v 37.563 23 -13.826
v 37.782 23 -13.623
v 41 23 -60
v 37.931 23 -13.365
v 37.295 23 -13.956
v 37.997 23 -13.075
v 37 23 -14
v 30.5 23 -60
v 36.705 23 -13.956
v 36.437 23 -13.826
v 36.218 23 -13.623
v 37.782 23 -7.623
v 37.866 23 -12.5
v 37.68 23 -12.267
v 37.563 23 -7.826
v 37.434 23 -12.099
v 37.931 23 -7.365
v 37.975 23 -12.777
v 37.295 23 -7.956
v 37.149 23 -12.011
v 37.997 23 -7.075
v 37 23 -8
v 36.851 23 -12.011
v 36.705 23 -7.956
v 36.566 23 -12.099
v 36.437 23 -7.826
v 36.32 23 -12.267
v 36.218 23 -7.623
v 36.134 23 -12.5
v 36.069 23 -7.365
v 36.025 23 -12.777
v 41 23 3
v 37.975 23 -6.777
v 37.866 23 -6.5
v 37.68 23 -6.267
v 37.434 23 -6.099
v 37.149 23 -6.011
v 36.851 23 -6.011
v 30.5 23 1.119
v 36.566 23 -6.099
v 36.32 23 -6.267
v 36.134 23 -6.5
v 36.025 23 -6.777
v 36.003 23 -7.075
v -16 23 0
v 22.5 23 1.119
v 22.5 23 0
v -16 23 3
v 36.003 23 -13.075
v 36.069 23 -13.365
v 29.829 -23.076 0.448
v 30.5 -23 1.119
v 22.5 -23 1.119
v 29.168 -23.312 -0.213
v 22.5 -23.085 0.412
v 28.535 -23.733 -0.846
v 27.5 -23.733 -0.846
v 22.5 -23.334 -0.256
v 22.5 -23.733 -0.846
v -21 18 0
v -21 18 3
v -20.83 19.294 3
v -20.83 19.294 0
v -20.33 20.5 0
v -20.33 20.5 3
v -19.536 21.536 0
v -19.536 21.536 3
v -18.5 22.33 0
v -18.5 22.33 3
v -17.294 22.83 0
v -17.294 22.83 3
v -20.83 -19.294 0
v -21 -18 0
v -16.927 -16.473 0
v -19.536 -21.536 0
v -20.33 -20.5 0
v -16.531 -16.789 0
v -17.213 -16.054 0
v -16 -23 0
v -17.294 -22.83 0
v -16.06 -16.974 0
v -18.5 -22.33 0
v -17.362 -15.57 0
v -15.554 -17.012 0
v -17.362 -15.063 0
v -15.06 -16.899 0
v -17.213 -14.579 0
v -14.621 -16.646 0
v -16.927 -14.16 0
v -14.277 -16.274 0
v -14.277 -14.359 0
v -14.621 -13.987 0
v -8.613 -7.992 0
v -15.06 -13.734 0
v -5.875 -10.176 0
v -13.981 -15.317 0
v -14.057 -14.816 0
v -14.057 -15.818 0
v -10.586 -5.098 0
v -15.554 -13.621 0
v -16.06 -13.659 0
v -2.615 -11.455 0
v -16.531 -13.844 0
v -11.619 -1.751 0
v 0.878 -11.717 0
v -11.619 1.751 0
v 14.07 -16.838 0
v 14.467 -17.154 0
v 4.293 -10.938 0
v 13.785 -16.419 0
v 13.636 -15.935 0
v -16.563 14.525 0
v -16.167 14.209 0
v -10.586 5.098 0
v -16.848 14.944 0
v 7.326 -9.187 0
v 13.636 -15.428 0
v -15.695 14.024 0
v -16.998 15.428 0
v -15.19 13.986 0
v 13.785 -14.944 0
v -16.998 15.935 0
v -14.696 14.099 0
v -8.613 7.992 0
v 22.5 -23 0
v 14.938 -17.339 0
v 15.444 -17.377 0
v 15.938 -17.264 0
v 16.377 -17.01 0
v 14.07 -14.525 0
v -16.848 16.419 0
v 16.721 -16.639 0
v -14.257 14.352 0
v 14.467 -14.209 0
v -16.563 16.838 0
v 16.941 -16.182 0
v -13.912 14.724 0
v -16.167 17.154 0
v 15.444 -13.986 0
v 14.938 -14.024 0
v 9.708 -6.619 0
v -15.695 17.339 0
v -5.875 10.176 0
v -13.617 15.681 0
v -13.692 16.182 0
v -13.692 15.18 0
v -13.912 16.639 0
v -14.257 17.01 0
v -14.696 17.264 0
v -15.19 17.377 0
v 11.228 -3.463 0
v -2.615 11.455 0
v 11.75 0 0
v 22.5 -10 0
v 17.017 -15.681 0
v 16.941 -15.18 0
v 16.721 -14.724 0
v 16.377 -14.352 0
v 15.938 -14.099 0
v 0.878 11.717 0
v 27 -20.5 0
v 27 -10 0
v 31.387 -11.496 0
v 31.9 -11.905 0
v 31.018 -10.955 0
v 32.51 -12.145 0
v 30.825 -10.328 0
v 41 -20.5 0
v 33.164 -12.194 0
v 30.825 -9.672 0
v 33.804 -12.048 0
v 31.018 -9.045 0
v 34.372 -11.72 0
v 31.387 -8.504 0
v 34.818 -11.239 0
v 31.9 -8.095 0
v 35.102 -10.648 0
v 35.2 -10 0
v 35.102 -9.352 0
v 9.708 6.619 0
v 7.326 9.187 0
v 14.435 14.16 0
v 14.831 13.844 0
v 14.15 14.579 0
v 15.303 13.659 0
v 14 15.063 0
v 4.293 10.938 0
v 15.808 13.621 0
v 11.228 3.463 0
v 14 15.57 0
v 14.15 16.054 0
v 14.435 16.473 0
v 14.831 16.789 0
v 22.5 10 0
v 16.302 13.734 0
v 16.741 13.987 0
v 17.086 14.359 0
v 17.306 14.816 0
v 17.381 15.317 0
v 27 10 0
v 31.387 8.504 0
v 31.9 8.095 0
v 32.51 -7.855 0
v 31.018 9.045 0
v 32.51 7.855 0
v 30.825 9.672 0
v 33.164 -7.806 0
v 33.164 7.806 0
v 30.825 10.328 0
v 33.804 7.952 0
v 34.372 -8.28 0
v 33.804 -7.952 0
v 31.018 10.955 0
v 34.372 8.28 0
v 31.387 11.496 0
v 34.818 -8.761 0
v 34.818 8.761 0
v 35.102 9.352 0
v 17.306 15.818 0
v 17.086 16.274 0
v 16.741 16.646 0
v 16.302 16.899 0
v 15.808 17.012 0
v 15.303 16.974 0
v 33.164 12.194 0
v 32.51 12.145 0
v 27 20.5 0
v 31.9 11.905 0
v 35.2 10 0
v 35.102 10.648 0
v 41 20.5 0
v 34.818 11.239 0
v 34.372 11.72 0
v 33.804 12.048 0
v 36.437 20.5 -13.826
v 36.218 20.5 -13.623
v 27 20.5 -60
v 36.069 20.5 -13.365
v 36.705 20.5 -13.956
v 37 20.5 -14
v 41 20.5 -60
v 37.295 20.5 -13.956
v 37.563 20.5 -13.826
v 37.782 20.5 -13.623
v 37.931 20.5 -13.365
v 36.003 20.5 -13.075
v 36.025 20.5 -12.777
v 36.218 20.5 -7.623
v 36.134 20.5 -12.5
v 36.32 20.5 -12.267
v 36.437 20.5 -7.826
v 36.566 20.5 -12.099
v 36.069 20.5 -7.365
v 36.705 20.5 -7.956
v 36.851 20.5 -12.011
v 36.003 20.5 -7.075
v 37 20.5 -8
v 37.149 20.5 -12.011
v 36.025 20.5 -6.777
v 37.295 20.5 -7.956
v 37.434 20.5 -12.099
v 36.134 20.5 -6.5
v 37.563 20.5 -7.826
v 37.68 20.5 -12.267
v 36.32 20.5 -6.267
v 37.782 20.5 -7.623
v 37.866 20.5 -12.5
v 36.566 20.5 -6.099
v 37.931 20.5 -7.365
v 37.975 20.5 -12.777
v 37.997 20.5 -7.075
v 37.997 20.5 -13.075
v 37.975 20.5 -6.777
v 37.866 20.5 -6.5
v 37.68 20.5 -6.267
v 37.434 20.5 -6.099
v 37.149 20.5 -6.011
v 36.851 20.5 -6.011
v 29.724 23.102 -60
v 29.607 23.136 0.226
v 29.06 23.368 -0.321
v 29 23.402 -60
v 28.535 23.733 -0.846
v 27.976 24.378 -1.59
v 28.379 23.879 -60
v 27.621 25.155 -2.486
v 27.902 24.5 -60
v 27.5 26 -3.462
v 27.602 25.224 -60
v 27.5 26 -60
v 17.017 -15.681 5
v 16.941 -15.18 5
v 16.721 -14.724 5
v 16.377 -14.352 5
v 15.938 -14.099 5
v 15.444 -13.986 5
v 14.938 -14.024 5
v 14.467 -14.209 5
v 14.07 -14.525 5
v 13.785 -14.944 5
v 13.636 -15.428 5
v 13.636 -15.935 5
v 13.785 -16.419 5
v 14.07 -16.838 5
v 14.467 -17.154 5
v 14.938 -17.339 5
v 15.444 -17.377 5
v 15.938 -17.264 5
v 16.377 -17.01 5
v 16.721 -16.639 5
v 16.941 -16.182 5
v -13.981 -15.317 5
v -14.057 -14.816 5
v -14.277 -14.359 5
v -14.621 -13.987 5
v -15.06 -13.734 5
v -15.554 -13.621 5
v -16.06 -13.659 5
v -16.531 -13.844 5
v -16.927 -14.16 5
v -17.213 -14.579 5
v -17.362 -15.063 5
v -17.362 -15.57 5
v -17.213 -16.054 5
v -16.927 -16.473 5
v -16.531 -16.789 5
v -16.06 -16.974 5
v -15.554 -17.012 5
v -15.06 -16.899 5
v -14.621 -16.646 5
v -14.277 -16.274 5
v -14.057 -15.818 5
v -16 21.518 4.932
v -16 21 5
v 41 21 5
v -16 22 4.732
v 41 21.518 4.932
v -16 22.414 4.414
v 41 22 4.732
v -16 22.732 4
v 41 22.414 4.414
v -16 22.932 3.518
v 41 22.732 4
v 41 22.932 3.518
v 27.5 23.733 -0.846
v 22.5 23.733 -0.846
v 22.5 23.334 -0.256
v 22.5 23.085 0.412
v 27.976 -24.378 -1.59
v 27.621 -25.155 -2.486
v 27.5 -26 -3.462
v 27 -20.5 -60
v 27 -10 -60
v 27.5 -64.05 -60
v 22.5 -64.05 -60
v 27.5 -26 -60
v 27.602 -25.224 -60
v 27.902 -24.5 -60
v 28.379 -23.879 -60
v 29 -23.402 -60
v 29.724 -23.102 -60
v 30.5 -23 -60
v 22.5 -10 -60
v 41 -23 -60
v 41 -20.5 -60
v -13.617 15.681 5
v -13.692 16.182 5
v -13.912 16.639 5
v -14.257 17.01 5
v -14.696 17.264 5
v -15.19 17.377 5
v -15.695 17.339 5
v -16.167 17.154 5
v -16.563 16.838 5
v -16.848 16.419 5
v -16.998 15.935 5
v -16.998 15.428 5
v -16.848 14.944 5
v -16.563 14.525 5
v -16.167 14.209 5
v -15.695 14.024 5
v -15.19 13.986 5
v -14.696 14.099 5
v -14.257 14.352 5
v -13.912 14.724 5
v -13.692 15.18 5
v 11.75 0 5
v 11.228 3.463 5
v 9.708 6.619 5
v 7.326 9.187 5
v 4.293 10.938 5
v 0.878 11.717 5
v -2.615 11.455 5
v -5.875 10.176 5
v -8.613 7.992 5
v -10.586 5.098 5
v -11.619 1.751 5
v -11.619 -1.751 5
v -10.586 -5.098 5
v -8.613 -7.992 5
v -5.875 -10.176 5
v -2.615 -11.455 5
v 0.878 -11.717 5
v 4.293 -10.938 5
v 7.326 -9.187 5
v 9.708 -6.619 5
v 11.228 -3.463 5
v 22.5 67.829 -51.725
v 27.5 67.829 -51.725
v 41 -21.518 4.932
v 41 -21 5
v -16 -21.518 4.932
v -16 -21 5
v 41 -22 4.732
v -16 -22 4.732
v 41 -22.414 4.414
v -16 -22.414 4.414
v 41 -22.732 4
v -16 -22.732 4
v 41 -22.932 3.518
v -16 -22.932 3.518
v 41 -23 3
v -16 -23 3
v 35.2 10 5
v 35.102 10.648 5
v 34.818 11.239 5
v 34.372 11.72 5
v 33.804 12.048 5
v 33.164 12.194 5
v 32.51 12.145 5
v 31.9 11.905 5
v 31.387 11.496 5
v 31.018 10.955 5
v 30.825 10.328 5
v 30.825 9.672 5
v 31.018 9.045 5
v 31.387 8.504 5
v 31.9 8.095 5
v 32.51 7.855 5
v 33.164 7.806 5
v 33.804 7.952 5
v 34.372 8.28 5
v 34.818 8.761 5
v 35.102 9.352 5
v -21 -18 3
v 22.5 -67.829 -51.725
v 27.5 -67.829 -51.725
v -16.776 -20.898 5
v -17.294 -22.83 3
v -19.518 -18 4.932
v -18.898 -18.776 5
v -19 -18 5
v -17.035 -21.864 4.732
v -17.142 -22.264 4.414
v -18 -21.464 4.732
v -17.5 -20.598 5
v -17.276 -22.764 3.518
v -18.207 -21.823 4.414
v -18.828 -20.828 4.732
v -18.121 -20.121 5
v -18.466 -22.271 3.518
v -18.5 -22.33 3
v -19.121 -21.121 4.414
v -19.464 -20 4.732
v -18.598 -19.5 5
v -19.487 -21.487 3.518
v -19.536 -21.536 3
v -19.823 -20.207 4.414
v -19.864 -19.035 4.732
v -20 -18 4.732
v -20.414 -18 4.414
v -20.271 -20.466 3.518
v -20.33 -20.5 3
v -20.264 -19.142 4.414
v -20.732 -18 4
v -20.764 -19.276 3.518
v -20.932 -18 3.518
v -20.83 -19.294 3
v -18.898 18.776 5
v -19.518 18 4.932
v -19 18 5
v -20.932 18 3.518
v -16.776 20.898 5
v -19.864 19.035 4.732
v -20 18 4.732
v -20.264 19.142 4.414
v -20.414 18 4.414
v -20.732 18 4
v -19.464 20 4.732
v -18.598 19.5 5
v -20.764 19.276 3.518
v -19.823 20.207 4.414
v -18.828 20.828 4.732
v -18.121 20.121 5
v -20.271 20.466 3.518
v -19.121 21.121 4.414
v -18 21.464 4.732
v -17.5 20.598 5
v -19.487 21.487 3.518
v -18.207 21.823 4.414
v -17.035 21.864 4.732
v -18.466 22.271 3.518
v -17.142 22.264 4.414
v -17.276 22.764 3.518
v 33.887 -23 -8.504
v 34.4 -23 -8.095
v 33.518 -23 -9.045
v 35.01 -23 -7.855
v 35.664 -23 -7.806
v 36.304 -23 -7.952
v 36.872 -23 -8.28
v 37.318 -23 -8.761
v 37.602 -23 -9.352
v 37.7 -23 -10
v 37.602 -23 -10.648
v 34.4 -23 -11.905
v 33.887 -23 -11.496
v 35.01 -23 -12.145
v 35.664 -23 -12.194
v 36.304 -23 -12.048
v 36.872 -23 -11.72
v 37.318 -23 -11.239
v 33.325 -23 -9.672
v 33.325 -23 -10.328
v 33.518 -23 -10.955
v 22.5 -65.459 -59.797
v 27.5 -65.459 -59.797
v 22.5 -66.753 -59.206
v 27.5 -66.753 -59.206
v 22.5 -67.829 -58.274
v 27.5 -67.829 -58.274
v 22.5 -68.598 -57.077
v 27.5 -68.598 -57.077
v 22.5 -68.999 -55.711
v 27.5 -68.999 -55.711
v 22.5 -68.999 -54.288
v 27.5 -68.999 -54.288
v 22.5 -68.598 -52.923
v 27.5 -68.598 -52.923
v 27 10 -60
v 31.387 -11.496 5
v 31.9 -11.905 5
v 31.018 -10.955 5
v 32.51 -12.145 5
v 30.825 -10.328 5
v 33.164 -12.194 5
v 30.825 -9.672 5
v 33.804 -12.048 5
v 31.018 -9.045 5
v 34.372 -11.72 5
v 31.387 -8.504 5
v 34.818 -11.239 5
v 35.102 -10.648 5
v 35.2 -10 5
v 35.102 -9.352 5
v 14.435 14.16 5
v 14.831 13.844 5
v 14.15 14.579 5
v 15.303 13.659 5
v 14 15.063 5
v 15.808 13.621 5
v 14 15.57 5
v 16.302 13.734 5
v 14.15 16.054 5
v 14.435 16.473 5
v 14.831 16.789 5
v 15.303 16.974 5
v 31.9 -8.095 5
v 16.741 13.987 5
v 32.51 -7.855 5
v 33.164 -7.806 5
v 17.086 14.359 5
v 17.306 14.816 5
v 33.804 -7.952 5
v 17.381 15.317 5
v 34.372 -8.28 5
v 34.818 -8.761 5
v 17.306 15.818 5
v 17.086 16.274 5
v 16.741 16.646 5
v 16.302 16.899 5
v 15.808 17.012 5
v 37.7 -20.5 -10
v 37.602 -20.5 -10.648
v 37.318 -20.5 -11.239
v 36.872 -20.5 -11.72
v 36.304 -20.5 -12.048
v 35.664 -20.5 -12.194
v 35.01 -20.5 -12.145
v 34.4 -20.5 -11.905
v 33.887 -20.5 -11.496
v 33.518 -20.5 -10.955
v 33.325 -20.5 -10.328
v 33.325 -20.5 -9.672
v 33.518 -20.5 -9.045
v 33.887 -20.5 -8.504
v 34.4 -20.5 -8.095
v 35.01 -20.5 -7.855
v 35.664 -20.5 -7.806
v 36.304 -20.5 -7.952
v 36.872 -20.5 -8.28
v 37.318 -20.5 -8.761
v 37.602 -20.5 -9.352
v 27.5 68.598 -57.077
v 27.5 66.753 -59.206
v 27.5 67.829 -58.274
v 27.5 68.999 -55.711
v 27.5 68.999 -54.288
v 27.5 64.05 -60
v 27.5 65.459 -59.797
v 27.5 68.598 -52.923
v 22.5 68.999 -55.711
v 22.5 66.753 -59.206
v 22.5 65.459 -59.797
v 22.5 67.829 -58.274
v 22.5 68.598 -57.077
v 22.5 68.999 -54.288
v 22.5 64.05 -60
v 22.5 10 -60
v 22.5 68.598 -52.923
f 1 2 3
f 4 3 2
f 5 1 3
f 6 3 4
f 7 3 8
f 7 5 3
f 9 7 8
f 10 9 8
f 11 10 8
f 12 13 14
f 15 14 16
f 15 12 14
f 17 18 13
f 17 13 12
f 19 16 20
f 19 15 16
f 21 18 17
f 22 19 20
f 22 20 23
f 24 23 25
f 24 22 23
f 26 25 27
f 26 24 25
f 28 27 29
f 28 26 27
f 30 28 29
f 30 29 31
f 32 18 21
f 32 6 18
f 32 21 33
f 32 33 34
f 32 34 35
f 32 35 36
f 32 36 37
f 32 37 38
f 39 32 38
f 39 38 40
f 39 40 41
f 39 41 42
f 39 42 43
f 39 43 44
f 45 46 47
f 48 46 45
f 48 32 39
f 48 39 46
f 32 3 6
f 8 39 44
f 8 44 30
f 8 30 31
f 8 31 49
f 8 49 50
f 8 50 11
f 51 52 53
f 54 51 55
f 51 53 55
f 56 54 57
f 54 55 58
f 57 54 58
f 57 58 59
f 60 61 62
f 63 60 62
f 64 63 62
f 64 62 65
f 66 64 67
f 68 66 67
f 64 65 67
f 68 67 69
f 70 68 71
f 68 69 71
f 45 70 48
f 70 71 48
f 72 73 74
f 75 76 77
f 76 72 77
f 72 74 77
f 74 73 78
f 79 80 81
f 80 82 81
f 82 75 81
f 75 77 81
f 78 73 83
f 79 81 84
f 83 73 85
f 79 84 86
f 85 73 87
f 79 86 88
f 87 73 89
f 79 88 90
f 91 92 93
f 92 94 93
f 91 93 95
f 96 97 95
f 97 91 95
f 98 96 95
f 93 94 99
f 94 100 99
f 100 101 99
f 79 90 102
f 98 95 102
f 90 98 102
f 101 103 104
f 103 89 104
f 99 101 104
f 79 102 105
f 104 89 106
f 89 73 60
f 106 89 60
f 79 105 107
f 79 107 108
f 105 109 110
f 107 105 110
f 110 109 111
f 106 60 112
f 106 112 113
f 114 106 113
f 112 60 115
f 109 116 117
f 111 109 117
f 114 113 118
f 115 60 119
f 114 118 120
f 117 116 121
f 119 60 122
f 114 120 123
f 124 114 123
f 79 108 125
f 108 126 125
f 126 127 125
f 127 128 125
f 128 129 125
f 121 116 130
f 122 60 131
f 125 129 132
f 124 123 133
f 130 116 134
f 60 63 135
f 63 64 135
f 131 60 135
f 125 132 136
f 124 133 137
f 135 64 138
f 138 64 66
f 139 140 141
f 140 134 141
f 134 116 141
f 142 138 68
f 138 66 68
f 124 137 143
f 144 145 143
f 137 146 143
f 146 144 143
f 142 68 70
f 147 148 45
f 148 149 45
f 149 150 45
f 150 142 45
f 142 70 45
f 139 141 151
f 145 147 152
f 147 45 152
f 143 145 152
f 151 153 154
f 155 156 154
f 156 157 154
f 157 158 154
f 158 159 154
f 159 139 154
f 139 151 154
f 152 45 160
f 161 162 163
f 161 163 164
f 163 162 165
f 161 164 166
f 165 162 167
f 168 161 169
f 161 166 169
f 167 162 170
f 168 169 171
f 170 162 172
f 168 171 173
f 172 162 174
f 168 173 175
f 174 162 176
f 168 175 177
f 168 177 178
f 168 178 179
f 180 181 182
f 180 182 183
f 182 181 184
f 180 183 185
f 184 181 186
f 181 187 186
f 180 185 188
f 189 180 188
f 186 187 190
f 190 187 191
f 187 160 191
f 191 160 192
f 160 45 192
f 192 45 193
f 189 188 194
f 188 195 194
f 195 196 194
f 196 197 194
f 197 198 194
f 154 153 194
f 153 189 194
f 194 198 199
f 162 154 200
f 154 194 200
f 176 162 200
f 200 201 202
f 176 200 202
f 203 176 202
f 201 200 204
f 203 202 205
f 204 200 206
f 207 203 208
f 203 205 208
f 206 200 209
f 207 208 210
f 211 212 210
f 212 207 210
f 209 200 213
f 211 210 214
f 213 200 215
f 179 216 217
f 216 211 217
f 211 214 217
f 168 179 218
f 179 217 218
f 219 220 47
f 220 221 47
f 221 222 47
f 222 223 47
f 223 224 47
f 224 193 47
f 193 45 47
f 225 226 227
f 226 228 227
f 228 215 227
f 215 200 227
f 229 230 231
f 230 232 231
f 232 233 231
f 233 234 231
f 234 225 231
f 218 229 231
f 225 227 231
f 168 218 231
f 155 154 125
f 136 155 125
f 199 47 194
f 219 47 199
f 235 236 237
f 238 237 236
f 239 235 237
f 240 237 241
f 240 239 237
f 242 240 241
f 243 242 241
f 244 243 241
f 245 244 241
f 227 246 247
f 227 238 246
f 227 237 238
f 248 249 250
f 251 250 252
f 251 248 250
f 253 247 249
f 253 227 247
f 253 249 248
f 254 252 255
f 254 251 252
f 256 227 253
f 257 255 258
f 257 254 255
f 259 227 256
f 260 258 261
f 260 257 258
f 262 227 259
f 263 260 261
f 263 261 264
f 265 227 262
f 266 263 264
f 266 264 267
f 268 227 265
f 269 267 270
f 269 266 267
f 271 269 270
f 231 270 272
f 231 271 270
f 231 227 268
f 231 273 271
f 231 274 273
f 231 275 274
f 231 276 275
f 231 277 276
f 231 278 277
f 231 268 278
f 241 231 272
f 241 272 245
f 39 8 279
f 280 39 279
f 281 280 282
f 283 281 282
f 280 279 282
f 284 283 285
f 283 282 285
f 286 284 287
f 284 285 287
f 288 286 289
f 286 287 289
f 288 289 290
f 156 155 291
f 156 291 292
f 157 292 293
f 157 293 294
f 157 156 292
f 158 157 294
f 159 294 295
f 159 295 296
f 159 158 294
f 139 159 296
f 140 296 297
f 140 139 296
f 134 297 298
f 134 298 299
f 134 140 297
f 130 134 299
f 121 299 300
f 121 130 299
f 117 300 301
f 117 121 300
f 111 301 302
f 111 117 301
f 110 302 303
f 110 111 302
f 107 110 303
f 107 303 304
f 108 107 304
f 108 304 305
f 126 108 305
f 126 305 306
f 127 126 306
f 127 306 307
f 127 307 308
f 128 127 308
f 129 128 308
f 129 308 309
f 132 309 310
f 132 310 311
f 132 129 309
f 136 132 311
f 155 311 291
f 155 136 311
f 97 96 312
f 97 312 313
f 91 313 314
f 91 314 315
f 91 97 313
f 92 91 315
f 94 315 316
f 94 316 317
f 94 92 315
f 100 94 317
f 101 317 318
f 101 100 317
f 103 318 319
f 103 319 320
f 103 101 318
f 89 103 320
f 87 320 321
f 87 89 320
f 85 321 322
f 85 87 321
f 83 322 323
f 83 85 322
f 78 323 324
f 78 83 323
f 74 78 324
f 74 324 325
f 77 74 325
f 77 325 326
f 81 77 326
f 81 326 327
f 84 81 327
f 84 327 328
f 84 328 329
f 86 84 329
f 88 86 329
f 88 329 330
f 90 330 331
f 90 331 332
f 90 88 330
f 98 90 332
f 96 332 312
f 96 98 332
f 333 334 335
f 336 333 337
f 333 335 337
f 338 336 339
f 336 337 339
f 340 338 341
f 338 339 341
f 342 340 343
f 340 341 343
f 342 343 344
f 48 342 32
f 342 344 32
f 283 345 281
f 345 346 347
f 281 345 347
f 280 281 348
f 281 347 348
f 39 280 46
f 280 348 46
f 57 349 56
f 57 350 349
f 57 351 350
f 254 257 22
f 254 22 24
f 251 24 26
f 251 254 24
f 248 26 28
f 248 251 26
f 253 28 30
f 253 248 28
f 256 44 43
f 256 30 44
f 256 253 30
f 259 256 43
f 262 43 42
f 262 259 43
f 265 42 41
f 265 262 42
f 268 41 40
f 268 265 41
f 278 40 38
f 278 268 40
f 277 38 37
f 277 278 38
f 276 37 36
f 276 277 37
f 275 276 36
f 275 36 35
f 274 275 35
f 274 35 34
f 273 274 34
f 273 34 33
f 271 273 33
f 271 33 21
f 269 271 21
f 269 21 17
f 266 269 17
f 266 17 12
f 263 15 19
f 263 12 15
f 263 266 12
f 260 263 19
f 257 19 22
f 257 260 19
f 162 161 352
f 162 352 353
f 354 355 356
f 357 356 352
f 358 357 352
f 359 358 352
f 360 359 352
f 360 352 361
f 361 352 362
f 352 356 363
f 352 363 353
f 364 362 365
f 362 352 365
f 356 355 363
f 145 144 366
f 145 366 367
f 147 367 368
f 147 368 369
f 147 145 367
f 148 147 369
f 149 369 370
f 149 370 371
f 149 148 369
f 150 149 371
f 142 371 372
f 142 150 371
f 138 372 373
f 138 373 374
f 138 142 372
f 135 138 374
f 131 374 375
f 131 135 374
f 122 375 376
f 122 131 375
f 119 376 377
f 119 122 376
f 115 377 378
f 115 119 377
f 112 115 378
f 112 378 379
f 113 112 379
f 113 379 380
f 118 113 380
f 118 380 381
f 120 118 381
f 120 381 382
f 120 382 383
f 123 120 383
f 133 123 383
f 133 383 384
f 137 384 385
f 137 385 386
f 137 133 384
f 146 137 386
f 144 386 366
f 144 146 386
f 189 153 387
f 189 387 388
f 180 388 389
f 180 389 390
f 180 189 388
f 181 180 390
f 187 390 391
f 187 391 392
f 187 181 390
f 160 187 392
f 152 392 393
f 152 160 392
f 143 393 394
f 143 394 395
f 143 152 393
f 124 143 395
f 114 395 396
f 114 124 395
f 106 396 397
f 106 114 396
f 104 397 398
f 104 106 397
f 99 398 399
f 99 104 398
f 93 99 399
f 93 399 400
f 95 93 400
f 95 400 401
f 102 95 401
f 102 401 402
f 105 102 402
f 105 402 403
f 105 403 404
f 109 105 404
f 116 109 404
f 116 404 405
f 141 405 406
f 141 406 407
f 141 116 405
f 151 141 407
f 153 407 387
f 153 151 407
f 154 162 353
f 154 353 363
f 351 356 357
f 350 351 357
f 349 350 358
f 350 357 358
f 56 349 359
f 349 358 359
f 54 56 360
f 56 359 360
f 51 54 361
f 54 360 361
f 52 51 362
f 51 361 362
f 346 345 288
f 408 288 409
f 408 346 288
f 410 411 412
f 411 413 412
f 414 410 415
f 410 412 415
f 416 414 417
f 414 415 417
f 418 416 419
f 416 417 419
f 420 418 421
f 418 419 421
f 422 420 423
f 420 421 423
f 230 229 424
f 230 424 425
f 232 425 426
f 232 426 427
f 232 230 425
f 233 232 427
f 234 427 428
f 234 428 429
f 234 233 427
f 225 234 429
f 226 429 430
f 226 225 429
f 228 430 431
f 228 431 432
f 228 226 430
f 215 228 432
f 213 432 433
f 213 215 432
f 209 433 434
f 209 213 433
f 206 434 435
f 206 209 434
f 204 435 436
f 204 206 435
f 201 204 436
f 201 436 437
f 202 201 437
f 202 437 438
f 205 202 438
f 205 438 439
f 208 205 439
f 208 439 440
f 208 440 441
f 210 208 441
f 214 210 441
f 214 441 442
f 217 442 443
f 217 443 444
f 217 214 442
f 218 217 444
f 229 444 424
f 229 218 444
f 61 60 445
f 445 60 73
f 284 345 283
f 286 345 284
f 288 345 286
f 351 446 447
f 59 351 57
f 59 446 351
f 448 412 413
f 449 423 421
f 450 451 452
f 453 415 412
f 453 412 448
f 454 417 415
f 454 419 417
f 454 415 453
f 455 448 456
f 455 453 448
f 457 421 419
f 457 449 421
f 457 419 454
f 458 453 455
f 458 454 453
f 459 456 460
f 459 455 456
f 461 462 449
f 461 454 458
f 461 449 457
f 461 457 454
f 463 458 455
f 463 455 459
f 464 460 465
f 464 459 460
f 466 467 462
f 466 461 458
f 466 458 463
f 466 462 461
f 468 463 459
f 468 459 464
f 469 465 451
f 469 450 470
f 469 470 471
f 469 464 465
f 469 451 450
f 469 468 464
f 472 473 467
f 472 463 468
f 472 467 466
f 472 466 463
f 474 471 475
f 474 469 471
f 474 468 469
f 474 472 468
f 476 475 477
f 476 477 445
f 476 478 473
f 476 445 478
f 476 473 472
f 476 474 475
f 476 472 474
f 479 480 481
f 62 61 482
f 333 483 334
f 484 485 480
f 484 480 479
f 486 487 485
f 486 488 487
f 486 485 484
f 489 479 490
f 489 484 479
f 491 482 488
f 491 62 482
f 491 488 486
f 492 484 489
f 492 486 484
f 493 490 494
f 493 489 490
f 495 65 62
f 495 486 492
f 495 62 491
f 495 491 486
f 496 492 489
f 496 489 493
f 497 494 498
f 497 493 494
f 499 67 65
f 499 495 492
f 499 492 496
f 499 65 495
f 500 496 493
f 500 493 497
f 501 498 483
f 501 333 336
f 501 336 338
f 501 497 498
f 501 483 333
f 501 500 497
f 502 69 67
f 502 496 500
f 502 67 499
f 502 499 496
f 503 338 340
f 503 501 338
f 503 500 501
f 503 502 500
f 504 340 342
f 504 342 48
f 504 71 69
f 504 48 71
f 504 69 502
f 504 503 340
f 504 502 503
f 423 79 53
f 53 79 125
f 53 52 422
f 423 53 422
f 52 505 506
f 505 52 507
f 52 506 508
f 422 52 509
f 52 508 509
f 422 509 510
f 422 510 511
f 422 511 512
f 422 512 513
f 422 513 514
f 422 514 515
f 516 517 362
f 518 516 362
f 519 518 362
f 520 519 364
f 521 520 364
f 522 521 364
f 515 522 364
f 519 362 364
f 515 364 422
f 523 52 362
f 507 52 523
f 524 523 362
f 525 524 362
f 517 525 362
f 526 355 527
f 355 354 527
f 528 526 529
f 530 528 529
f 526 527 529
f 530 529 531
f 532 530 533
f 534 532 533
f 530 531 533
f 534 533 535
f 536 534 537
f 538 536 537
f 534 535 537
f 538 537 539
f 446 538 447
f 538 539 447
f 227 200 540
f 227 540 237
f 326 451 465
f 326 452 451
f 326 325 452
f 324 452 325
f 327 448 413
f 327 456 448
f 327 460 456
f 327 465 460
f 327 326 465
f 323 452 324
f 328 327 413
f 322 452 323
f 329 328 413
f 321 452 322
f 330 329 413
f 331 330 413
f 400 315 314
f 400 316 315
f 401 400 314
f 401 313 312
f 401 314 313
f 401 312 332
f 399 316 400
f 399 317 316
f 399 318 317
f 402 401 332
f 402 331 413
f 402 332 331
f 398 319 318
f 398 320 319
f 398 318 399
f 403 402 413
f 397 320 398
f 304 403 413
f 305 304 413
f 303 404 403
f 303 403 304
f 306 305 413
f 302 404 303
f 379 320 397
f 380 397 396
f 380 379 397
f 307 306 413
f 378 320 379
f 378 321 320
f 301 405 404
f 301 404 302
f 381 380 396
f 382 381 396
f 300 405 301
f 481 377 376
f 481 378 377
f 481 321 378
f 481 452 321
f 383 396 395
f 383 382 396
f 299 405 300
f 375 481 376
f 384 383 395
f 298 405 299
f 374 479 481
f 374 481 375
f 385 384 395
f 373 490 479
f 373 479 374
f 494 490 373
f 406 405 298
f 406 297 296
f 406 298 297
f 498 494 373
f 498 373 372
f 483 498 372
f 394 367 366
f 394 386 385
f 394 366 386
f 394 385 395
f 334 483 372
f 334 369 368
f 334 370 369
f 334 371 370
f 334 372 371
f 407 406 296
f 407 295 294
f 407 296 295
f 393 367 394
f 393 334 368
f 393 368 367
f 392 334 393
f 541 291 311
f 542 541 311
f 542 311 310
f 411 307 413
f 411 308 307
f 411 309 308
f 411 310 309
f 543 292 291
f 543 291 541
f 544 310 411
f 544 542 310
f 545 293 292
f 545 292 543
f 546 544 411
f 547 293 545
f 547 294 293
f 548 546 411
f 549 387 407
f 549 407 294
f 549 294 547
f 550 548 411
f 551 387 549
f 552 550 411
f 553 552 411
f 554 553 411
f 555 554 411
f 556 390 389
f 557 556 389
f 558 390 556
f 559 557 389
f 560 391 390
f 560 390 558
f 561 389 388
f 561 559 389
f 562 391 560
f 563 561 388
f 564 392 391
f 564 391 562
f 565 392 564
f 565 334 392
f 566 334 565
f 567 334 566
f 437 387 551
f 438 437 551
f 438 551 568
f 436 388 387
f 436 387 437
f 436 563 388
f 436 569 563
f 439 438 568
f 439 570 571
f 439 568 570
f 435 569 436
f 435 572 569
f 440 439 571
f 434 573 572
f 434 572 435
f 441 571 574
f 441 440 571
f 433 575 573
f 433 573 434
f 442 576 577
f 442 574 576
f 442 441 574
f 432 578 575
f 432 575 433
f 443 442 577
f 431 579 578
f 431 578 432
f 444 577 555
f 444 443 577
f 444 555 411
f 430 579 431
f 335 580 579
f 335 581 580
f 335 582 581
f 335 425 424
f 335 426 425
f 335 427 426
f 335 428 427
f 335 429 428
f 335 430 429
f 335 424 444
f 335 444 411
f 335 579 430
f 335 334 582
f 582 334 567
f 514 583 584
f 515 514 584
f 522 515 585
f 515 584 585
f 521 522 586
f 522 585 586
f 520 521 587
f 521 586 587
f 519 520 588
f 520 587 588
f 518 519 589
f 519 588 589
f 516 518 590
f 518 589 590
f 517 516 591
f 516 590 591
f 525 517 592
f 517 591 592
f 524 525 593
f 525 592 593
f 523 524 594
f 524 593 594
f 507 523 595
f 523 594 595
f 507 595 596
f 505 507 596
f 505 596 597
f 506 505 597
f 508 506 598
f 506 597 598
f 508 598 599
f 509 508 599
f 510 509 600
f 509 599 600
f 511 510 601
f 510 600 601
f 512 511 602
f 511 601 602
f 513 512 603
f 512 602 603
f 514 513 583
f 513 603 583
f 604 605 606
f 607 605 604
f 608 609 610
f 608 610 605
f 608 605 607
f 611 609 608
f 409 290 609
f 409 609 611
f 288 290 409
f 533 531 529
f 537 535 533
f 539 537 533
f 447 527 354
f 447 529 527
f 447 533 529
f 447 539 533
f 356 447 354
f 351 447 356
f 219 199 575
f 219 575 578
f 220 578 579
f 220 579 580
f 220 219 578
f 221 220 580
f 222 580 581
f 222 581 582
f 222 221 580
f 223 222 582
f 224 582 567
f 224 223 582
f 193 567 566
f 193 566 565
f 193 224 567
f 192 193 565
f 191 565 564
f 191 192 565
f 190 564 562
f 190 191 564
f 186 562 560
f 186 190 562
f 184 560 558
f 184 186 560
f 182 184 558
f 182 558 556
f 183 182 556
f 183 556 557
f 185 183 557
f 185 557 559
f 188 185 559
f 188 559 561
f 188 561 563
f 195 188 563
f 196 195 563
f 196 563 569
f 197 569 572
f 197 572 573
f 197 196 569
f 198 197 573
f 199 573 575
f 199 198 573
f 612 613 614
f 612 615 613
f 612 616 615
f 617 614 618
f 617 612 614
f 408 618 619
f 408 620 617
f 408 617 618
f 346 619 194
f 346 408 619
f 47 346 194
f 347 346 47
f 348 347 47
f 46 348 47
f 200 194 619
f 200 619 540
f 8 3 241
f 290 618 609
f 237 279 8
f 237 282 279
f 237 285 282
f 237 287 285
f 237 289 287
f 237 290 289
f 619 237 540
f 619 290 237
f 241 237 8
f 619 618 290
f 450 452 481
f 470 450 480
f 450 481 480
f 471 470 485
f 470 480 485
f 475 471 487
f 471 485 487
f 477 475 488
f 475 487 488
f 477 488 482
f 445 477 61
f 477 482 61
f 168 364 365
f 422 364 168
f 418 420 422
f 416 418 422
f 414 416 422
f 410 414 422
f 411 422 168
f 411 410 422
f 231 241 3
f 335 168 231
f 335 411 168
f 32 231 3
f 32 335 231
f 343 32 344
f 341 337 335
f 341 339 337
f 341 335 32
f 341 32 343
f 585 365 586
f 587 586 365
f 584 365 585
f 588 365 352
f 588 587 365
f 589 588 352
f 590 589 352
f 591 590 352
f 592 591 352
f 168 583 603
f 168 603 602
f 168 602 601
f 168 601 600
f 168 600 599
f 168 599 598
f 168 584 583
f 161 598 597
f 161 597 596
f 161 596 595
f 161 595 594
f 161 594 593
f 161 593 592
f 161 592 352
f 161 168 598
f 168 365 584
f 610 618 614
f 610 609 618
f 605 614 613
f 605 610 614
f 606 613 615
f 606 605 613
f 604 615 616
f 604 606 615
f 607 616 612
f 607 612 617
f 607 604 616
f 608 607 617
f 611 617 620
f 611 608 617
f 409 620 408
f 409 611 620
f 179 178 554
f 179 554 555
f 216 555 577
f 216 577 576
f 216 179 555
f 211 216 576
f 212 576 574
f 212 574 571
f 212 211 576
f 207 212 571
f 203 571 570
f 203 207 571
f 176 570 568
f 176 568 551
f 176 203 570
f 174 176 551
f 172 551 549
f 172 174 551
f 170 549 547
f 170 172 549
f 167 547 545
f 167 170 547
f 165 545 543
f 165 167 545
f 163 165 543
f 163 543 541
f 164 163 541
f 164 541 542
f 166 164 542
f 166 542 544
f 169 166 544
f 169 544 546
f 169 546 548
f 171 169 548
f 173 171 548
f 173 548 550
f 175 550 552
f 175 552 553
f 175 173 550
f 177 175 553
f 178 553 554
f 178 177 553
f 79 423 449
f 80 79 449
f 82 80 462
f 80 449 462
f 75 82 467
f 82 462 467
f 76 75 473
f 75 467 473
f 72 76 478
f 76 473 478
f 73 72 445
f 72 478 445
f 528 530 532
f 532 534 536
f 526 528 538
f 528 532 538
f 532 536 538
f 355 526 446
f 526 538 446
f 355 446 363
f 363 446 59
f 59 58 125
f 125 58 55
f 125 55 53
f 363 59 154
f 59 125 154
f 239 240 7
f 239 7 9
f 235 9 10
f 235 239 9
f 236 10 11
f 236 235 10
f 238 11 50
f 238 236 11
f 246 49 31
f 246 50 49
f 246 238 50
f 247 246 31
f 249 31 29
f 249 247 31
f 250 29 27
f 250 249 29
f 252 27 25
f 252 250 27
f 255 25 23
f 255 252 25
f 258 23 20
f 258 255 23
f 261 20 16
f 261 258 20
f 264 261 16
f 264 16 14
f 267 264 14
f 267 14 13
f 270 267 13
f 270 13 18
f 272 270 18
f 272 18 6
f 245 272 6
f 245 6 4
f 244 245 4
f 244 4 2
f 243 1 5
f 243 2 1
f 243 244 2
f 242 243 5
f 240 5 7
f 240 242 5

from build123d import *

# Parameters (mm, degrees)
SKETCH_1_W          = 14
SKETCH_1_H          = 2.5
SKETCH_1_R          = 1.7
SKETCH_1_R_2        = 11.75
SKETCH_1_R_3        = 2.2
SKETCH_1_W_2        = 4.5
SKETCH_1_H_2        = 20
EXTRUDE_1_DEPTH     = 5
EXTRUDE_2_DEPTH     = 60
CUT_EXTRUDE_1_REACH = 78.223
CUT_EXTRUDE_2_REACH = 78.223
SKETCH_2_3_R        = 1
EXTRUDE_3_DEPTH     = 5
FILLET_1_R          = 5
FILLET_START        = 22.5
FILLET_2_DEPTH      = 5
FILLET_START_2      = -60
FILLET_2_2_DEPTH    = 61.119099979
FILLET_START_3      = 27.5
FILLET_2_3_DEPTH    = 3
FILLET_3_R          = 2


with BuildPart() as part:
    # 草图1 → 凸台-拉伸1 (new body)
    # profile 1 of 9: a face of its own
    with BuildSketch(Plane.XY):
        with Locations((34, 21.75)):
            Rectangle(SKETCH_1_W, SKETCH_1_H)
    # profile 2 of 9: a face of its own
    with BuildSketch(Plane.XY):
        Polygon((27, 23), (22.5, 23), (22.5, 21.5), (22.5, 10), (27, 10), (27, 20.5), align=None)
    # profile 3 of 9: a face of its own
    with BuildSketch(Plane.XY):
        Polygon((-21, 23), (-21, 21.5), (21, 21.5), (22.5, 21.5), (22.5, 23), align=None)
    # profile 4 of 9: a face of its own
    with BuildSketch(Plane.XY):
        Polygon((21, 21.5), (-21, 21.5), (-21, -21.5), (21, -21.5), (22.5, -21.5), (22.5, -10), (22.5, 10), (22.5, 21.5), align=None)
        with Locations((-15.68126777, -15.316587124)):
            Circle(SKETCH_1_R, mode=Mode.SUBTRACT)
        with Locations((15.316587124, -15.68126777)):
            Circle(SKETCH_1_R, mode=Mode.SUBTRACT)
        Circle(SKETCH_1_R_2, mode=Mode.SUBTRACT)
        with Locations((-15.316587124, 15.68126777)):
            Circle(SKETCH_1_R, mode=Mode.SUBTRACT)
        with Locations((15.68126777, 15.316587124)):
            Circle(SKETCH_1_R, mode=Mode.SUBTRACT)
    # profile 5 of 9: a face of its own
    with BuildSketch(Plane.XY):
        Polygon((41, 20.5), (27, 20.5), (27, 10), (27, -10), (27, -20.5), (41, -20.5), align=None)
        with Locations((33, -10)):
            Circle(SKETCH_1_R_3, mode=Mode.SUBTRACT)
        with Locations((33, 10)):
            Circle(SKETCH_1_R_3, mode=Mode.SUBTRACT)
    # profile 6 of 9: a face of its own
    with BuildSketch(Plane.XY):
        with Locations((24.75, 0)):
            Rectangle(SKETCH_1_W_2, SKETCH_1_H_2)
    # profile 7 of 9: a face of its own
    with BuildSketch(Plane.XY):
        Polygon((22.5, -10), (22.5, -21.5), (22.5, -23), (27, -23), (27, -20.5), (27, -10), align=None)
    # profile 8 of 9: a face of its own
    with BuildSketch(Plane.XY):
        with Locations((34, -21.75)):
            Rectangle(SKETCH_1_W, SKETCH_1_H)
    # profile 9 of 9: a face of its own
    with BuildSketch(Plane.XY):
        Polygon((21, -21.5), (-21, -21.5), (-21, -23), (22.5, -23), (22.5, -21.5), align=None)
    extrude(amount=EXTRUDE_1_DEPTH)

    # 草图1<4> → 凸台-拉伸2 (add)
    with BuildSketch(Plane.XY):
        Polygon((22.5, 23), (22.5, 10), (27, 10), (27, 20.5), (41, 20.5), (41, 23), align=None)
        Polygon((22.5, -10), (22.5, -23), (41, -23), (41, -20.5), (27, -20.5), (27, -10), align=None)
    extrude(amount=-EXTRUDE_2_DEPTH)

    # 草图2 → 切除-拉伸1 (cut, up to next)
    with BuildSketch(Plane(origin=(0, 0, 0), x_dir=(1, 0, 0), z_dir=(0, 1, 0)), mode=Mode.PRIVATE) as cut_extrude_1_sk1:
        with BuildLine():
            ThreePointArc((37.7, 10), (35.5, 12.2), (33.3, 10))
            Line((33.3, 10), (37.7, 10))
        make_face()
    cut_extrude_1_tool1 = extrude(cut_extrude_1_sk1.sketch, amount=-CUT_EXTRUDE_1_REACH, mode=Mode.PRIVATE) & part.part
    # 草图2 → 切除-拉伸1 (cut, up to next)
    with BuildSketch(Plane(origin=(0, 0, 0), x_dir=(1, 0, 0), z_dir=(0, 1, 0)), mode=Mode.PRIVATE) as cut_extrude_1_sk2:
        with BuildLine():
            Line((37.7, 10), (33.3, 10))
            ThreePointArc((33.3, 10), (35.5, 7.8), (37.7, 10))
        make_face()
    cut_extrude_1_tool2 = extrude(cut_extrude_1_sk2.sketch, amount=-CUT_EXTRUDE_1_REACH, mode=Mode.PRIVATE) & part.part
    # 草图2 → 切除-拉伸1 (cut, up to next)
    with BuildSketch(Plane(origin=(0, 0, 0), x_dir=(1, 0, 0), z_dir=(0, 1, 0)), mode=Mode.PRIVATE) as cut_extrude_1_sk3:
        with BuildLine():
            ThreePointArc((37.7, 10), (35.5, 12.2), (33.3, 10))
            Line((33.3, 10), (37.7, 10))
        make_face()
    cut_extrude_1_tool3 = extrude(cut_extrude_1_sk3.sketch, amount=-CUT_EXTRUDE_1_REACH, mode=Mode.PRIVATE) & part.part
    # 草图2 → 切除-拉伸1 (cut, up to next)
    with BuildSketch(Plane(origin=(0, 0, 0), x_dir=(1, 0, 0), z_dir=(0, 1, 0)), mode=Mode.PRIVATE) as cut_extrude_1_sk4:
        with BuildLine():
            Line((37.7, 10), (33.3, 10))
            ThreePointArc((33.3, 10), (35.5, 7.8), (37.7, 10))
        make_face()
    cut_extrude_1_tool4 = extrude(cut_extrude_1_sk4.sketch, amount=-CUT_EXTRUDE_1_REACH, mode=Mode.PRIVATE) & part.part
    add(cut_extrude_1_tool1.solids().sort_by_distance((35.5, 0, -10.933709))[0], mode=Mode.SUBTRACT)
    add(cut_extrude_1_tool2.solids().sort_by_distance((35.5, 0, -9.066291))[0], mode=Mode.SUBTRACT)
    add(cut_extrude_1_tool3.solids().sort_by_distance((35.5, 0, -10.933709))[0], mode=Mode.SUBTRACT)
    add(cut_extrude_1_tool4.solids().sort_by_distance((35.5, 0, -9.066291))[0], mode=Mode.SUBTRACT)

    # 草图2<3> → 切除-拉伸2 (cut, up to next)
    with BuildSketch(Plane(origin=(0, 0, 0), x_dir=(1, 0, 0), z_dir=(0, 1, 0)), mode=Mode.PRIVATE) as cut_extrude_2_sk1:
        with Locations(Location((37, 7, 0), (0, 0, 90))):
            Circle(SKETCH_2_3_R)
    cut_extrude_2_tool1 = extrude(cut_extrude_2_sk1.sketch, amount=CUT_EXTRUDE_2_REACH, mode=Mode.PRIVATE) & part.part
    # 草图2<3> → 切除-拉伸2 (cut, up to next)
    with BuildSketch(Plane(origin=(0, 0, 0), x_dir=(1, 0, 0), z_dir=(0, 1, 0)), mode=Mode.PRIVATE) as cut_extrude_2_sk2:
        with Locations(Location((37, 13, 0), (0, 0, 90))):
            Circle(SKETCH_2_3_R)
    cut_extrude_2_tool2 = extrude(cut_extrude_2_sk2.sketch, amount=CUT_EXTRUDE_2_REACH, mode=Mode.PRIVATE) & part.part
    add(cut_extrude_2_tool1.solids().sort_by_distance((37, 0, -7))[0], mode=Mode.SUBTRACT)
    add(cut_extrude_2_tool2.solids().sort_by_distance((37, 0, -13))[0], mode=Mode.SUBTRACT)

    # 草图5 → 凸台-拉伸3 (add)
    with BuildSketch(Plane.ZY.offset(-22.5)):
        Polygon((-60, 75), (-60, 23), (0, 23), align=None)
        Polygon((0, -23), (-60, -23), (-60, -75), align=None)
    extrude(amount=-EXTRUDE_3_DEPTH)

    # 圆角1
    fillet_1_edges = [part.edges().sort_by_distance(p)[0] for p in [
        (25, -75, -60),
        (25, 75, -60),
        (-21, -23, 2.5),
        (-21, 23, 2.5),
    ]]
    fillet(fillet_1_edges, radius=FILLET_1_R)

    # 圆角2: read off the stored shape, not the designer's step
    # 圆角2 outline → 圆角2 (add)
    with BuildSketch(Plane.YZ.offset(FILLET_START)):
        with BuildLine():
            ThreePointArc((-23, 1.119099979), (-23.189199247, 0.070577625), (-23.732932752, -0.845691636))
            Line((-23.732932752, -0.845691636), (-23, 0))
            Line((-23, 0), (-23, 1.119099979))
        make_face()
        with BuildLine():
            Line((23, 0), (23.732932752, -0.845691636))
            ThreePointArc((23.732932752, -0.845691636), (23.189199247, 0.070577625), (23, 1.119099979))
            Line((23, 1.119099979), (23, 0))
        make_face()
    extrude(amount=FILLET_2_DEPTH)

    # Fillet 2 2 outline → Fillet 2 2 (add)
    with BuildSketch(Plane.XY.offset(FILLET_START_2)):
        with BuildLine():
            Line((27.5, -23), (27.5, -26))
            ThreePointArc((27.5, -26), (28.378679656, -23.878679656), (30.5, -23))
            Line((30.5, -23), (27.5, -23))
        make_face()
        with BuildLine():
            Line((27.5, 23), (30.5, 23))
            ThreePointArc((30.5, 23), (28.378679656, 23.878679656), (27.5, 26))
            Line((27.5, 26), (27.5, 23))
        make_face()
    extrude(amount=FILLET_2_2_DEPTH)

    # Fillet 2 3 outline → Fillet 2 3 (cut)
    with BuildSketch(Plane.YZ.offset(FILLET_START_3)):
        with BuildLine():
            Line((-27.333333343, -5), (-23.732932752, -0.845691636))
            ThreePointArc((-23.732932752, -0.845691636), (-23.189199247, 0.070577625), (-23, 1.119099979))
            Line((-23, 1.119099979), (-28, 1.119099979))
            Line((-28, 1.119099979), (-28, -5))
            Line((-28, -5), (-27.333333343, -5))
        make_face()
        with BuildLine():
            Line((23.732932752, -0.845691636), (27.333333343, -5))
            Line((27.333333343, -5), (28, -5))
            Line((28, -5), (28, 1.119099979))
            Line((28, 1.119099979), (23, 1.119099979))
            ThreePointArc((23, 1.119099979), (23.189199247, 0.070577625), (23.732932752, -0.845691636))
        make_face()
    extrude(amount=FILLET_2_3_DEPTH, mode=Mode.SUBTRACT)

    # 圆角3
    fillet_3_edges = [part.edges().sort_by_distance(p)[0] for p in [
        (-21, 0, 5),
        (12.5, 23, 5),
        (-19.535533906, 21.535533906, 5),
        (-19.535533906, -21.535533906, 5),
        (12.5, -23, 5),
    ]]
    fillet(fillet_3_edges, radius=FILLET_3_R)


solid = part.part
